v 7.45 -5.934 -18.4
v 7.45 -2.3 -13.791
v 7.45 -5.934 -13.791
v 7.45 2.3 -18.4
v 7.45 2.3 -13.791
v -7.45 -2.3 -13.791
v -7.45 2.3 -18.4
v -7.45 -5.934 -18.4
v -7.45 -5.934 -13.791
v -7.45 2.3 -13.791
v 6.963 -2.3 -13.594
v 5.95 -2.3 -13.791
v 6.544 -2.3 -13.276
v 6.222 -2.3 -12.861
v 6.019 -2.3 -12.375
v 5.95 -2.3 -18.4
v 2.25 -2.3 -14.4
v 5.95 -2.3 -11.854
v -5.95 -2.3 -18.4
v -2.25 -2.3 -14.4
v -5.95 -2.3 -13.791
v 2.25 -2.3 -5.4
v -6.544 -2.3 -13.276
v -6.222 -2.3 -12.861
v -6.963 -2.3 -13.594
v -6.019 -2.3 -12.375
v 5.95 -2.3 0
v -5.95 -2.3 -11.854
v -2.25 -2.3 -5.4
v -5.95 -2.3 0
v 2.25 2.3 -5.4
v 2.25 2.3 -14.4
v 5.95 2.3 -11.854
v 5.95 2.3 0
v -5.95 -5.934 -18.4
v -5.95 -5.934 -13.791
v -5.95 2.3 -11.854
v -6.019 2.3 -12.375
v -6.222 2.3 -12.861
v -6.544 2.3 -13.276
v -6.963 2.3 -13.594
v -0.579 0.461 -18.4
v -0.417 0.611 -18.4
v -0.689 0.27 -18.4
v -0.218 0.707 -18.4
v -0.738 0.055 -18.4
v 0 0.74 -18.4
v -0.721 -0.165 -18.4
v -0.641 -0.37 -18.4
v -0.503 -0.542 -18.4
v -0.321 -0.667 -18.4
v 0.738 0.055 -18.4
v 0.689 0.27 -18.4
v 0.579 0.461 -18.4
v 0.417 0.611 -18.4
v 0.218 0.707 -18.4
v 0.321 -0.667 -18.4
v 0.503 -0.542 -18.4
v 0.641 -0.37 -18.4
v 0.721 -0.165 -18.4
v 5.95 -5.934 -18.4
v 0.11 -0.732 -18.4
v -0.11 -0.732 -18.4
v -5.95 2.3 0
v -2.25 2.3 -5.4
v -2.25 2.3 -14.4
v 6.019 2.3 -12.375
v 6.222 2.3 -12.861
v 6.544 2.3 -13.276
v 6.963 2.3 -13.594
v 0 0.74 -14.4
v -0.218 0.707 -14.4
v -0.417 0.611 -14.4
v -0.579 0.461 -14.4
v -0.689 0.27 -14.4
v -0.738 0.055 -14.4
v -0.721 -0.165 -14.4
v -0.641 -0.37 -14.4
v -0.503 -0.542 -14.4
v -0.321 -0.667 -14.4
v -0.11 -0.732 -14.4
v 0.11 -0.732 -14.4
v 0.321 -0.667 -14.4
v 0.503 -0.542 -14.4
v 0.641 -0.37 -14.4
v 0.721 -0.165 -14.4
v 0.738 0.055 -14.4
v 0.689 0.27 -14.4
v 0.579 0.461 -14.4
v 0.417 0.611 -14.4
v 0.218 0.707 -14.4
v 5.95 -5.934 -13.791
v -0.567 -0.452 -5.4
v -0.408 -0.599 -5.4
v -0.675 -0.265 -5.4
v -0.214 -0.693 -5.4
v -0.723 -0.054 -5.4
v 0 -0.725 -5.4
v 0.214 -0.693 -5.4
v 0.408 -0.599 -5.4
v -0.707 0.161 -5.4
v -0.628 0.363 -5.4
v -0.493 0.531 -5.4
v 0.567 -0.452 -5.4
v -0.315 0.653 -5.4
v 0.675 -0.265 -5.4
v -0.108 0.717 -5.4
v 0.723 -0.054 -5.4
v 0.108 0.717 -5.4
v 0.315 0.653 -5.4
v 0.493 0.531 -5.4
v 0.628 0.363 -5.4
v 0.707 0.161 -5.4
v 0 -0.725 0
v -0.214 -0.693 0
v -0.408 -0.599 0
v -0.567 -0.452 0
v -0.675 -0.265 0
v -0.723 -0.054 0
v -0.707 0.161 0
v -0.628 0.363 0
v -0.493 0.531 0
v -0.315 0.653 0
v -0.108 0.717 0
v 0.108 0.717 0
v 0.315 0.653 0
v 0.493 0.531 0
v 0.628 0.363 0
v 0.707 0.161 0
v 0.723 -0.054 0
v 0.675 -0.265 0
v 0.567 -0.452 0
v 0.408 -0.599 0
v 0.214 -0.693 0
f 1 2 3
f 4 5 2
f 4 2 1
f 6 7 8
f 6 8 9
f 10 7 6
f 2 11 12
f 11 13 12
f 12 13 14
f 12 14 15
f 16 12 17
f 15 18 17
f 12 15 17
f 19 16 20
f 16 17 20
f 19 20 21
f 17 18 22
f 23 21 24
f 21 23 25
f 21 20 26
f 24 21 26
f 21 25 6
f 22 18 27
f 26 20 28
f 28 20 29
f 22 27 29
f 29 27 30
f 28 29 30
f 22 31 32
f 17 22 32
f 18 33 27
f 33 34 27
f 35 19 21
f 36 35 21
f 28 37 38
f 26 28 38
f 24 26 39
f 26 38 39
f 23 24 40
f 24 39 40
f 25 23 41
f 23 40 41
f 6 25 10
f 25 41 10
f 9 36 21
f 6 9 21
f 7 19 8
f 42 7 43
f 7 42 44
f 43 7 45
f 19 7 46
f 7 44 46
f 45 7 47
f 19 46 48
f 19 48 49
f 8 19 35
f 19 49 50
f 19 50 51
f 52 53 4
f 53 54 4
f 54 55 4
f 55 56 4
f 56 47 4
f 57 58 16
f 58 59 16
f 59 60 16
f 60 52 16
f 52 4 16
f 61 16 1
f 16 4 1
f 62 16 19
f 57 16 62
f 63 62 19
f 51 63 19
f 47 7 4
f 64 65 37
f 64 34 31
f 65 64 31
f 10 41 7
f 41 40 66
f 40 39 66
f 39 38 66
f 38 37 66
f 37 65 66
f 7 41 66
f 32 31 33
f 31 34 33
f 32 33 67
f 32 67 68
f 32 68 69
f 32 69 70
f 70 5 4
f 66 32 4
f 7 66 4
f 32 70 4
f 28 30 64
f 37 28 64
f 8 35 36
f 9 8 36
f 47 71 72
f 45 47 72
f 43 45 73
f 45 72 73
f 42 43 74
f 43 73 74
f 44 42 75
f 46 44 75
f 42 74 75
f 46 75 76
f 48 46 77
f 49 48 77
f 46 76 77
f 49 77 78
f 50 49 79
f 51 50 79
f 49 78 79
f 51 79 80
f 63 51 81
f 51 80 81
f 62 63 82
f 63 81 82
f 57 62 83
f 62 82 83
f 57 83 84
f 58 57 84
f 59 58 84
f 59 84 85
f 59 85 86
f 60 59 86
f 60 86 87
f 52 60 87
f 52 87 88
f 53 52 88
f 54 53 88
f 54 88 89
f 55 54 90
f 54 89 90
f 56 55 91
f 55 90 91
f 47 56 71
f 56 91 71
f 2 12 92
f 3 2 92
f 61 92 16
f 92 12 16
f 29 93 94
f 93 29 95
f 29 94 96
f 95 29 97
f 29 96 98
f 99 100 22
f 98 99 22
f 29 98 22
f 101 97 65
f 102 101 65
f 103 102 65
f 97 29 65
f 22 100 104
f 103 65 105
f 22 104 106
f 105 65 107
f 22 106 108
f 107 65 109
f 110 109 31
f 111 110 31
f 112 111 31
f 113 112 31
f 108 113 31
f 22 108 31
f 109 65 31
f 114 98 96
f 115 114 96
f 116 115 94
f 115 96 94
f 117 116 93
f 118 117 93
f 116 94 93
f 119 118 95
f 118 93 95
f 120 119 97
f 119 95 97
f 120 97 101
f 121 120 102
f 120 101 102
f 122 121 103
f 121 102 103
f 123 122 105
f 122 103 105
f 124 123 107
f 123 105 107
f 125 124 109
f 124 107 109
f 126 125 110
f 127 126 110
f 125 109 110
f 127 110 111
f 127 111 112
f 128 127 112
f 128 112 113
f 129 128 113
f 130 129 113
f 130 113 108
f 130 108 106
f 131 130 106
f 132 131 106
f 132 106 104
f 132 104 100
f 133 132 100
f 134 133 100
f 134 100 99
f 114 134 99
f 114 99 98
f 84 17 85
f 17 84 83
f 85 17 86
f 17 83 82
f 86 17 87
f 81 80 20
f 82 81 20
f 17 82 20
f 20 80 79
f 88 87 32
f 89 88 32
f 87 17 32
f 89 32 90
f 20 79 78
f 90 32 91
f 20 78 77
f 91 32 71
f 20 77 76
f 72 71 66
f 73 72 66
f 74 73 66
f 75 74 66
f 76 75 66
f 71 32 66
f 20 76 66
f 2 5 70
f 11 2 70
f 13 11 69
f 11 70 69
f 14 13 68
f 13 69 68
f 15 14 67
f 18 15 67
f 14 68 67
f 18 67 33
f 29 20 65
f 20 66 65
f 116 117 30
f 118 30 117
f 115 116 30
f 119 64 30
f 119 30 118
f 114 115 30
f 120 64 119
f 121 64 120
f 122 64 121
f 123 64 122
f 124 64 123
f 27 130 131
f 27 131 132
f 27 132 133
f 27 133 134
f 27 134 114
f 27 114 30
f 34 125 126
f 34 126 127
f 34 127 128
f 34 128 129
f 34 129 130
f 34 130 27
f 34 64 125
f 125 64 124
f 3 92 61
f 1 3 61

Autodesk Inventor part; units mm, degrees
ref_plane "YZ Plane" through (0, 0, 0) normal (1, 0, 0) x (0, 1, 0)
ref_plane "XZ Plane" through (0, 0, 0) normal (0, 1, 0) x (-1, 0, 0)
ref_plane "XY Plane" through (0, 0, 0) normal (0, 0, 1) x (1, 0, 0)
sketch "Sketch6" plane through (0, 0, 0) normal (0, 0, 1) x (1, 0, 0)
  line L0 (-5.95, 2.3) -> (5.95, 2.3)
  line L1 (5.95, 2.3) -> (5.95, -2.3)
  line L2 (5.95, -2.3) -> (-5.95, -2.3)
  line L3 (-5.95, -2.3) -> (-5.95, 2.3)
  line L4 (-5.95, 2.3) -> (5.95, -2.3) construction
  line L5 (5.95, 2.3) -> (-5.95, -2.3) construction
  point P0 (0, 0)
  point P1 (0, 0)
  dimension "d66" = 11.9
  dimension "d67" = 4.6
extrude "Extrusion6" add sketch "Sketch6" against normal blind 18.4
hole "Hole6" at (0, 0, 0) direction (0, 0, -1) diameter 1.45 depth 7 tip angle 118
sketch "Sketch7" plane through (5.95, -2.3, 0) normal (1, 0, 0) x (0, 0, -1)
  line L0 (18.4, 4.6) -> (13.7908, 4.6)
  line L1 (13.7908, 4.6) -> (13.7908, -3.6343)
  line L2 (13.7908, -3.6343) -> (18.4, -3.6343)
  line L3 (18.4, -3.6343) -> (18.4, 4.6)
  point P0 (0, 2.3)
extrude "Extrusion7" add sketch "Sketch7" along normal blind 1.5
ref_plane "Work Plane13" through (0, -2.3, 0) normal (1, 0, 0) x (0, 0, -1)
mirror "Mirror1" about plane through (0, -2.3, 0) normal (1, 0, 0) of "Extrusion7"
fillet "Fillet3" radius 2 2 edges at (5.95, 0, -13.7908) (-5.95, 0, -13.7908)
sketch "Sketch8" plane through (-5.95, 2.3, 0) normal (0, 1, 0) x (1, 0, 0)
  line L0 (3.7, 5.4) -> (8.2, 5.4)
  line L1 (8.2, 5.4) -> (8.2, 14.4)
  line L2 (8.2, 14.4) -> (3.7, 14.4)
  line L3 (3.7, 14.4) -> (3.7, 5.4)
  line L4 (3.7, 5.4) -> (8.2, 14.4) construction
  line L5 (8.2, 5.4) -> (3.7, 14.4) construction
  line L6 (5.95, 22.08) -> (5.95, -3.68) construction
  line L7 (13.4, 18.4) -> (-1.5, 18.4) projected
  point P0 (5.95, 0)
  point P1 (5.95, 9.9)
  point P2 (5.95, 9.9)
  dimension "d87" = 4
  dimension "d88" = 4.5
  dimension "d101" = 9
extrude "Extrusion8" cut sketch "Sketch8" against normal through all
ref_plane "Work Plane14" through (-5.95, 0, 0) normal (0, 1, 0) x (1, 0, 0)
hole "Hole7" at (0, 0, -18.4) direction (0, 0, 1) diameter 1.48 depth 7 tip angle 118
properties part number "servo_attachement" material "ABS Plastic"
